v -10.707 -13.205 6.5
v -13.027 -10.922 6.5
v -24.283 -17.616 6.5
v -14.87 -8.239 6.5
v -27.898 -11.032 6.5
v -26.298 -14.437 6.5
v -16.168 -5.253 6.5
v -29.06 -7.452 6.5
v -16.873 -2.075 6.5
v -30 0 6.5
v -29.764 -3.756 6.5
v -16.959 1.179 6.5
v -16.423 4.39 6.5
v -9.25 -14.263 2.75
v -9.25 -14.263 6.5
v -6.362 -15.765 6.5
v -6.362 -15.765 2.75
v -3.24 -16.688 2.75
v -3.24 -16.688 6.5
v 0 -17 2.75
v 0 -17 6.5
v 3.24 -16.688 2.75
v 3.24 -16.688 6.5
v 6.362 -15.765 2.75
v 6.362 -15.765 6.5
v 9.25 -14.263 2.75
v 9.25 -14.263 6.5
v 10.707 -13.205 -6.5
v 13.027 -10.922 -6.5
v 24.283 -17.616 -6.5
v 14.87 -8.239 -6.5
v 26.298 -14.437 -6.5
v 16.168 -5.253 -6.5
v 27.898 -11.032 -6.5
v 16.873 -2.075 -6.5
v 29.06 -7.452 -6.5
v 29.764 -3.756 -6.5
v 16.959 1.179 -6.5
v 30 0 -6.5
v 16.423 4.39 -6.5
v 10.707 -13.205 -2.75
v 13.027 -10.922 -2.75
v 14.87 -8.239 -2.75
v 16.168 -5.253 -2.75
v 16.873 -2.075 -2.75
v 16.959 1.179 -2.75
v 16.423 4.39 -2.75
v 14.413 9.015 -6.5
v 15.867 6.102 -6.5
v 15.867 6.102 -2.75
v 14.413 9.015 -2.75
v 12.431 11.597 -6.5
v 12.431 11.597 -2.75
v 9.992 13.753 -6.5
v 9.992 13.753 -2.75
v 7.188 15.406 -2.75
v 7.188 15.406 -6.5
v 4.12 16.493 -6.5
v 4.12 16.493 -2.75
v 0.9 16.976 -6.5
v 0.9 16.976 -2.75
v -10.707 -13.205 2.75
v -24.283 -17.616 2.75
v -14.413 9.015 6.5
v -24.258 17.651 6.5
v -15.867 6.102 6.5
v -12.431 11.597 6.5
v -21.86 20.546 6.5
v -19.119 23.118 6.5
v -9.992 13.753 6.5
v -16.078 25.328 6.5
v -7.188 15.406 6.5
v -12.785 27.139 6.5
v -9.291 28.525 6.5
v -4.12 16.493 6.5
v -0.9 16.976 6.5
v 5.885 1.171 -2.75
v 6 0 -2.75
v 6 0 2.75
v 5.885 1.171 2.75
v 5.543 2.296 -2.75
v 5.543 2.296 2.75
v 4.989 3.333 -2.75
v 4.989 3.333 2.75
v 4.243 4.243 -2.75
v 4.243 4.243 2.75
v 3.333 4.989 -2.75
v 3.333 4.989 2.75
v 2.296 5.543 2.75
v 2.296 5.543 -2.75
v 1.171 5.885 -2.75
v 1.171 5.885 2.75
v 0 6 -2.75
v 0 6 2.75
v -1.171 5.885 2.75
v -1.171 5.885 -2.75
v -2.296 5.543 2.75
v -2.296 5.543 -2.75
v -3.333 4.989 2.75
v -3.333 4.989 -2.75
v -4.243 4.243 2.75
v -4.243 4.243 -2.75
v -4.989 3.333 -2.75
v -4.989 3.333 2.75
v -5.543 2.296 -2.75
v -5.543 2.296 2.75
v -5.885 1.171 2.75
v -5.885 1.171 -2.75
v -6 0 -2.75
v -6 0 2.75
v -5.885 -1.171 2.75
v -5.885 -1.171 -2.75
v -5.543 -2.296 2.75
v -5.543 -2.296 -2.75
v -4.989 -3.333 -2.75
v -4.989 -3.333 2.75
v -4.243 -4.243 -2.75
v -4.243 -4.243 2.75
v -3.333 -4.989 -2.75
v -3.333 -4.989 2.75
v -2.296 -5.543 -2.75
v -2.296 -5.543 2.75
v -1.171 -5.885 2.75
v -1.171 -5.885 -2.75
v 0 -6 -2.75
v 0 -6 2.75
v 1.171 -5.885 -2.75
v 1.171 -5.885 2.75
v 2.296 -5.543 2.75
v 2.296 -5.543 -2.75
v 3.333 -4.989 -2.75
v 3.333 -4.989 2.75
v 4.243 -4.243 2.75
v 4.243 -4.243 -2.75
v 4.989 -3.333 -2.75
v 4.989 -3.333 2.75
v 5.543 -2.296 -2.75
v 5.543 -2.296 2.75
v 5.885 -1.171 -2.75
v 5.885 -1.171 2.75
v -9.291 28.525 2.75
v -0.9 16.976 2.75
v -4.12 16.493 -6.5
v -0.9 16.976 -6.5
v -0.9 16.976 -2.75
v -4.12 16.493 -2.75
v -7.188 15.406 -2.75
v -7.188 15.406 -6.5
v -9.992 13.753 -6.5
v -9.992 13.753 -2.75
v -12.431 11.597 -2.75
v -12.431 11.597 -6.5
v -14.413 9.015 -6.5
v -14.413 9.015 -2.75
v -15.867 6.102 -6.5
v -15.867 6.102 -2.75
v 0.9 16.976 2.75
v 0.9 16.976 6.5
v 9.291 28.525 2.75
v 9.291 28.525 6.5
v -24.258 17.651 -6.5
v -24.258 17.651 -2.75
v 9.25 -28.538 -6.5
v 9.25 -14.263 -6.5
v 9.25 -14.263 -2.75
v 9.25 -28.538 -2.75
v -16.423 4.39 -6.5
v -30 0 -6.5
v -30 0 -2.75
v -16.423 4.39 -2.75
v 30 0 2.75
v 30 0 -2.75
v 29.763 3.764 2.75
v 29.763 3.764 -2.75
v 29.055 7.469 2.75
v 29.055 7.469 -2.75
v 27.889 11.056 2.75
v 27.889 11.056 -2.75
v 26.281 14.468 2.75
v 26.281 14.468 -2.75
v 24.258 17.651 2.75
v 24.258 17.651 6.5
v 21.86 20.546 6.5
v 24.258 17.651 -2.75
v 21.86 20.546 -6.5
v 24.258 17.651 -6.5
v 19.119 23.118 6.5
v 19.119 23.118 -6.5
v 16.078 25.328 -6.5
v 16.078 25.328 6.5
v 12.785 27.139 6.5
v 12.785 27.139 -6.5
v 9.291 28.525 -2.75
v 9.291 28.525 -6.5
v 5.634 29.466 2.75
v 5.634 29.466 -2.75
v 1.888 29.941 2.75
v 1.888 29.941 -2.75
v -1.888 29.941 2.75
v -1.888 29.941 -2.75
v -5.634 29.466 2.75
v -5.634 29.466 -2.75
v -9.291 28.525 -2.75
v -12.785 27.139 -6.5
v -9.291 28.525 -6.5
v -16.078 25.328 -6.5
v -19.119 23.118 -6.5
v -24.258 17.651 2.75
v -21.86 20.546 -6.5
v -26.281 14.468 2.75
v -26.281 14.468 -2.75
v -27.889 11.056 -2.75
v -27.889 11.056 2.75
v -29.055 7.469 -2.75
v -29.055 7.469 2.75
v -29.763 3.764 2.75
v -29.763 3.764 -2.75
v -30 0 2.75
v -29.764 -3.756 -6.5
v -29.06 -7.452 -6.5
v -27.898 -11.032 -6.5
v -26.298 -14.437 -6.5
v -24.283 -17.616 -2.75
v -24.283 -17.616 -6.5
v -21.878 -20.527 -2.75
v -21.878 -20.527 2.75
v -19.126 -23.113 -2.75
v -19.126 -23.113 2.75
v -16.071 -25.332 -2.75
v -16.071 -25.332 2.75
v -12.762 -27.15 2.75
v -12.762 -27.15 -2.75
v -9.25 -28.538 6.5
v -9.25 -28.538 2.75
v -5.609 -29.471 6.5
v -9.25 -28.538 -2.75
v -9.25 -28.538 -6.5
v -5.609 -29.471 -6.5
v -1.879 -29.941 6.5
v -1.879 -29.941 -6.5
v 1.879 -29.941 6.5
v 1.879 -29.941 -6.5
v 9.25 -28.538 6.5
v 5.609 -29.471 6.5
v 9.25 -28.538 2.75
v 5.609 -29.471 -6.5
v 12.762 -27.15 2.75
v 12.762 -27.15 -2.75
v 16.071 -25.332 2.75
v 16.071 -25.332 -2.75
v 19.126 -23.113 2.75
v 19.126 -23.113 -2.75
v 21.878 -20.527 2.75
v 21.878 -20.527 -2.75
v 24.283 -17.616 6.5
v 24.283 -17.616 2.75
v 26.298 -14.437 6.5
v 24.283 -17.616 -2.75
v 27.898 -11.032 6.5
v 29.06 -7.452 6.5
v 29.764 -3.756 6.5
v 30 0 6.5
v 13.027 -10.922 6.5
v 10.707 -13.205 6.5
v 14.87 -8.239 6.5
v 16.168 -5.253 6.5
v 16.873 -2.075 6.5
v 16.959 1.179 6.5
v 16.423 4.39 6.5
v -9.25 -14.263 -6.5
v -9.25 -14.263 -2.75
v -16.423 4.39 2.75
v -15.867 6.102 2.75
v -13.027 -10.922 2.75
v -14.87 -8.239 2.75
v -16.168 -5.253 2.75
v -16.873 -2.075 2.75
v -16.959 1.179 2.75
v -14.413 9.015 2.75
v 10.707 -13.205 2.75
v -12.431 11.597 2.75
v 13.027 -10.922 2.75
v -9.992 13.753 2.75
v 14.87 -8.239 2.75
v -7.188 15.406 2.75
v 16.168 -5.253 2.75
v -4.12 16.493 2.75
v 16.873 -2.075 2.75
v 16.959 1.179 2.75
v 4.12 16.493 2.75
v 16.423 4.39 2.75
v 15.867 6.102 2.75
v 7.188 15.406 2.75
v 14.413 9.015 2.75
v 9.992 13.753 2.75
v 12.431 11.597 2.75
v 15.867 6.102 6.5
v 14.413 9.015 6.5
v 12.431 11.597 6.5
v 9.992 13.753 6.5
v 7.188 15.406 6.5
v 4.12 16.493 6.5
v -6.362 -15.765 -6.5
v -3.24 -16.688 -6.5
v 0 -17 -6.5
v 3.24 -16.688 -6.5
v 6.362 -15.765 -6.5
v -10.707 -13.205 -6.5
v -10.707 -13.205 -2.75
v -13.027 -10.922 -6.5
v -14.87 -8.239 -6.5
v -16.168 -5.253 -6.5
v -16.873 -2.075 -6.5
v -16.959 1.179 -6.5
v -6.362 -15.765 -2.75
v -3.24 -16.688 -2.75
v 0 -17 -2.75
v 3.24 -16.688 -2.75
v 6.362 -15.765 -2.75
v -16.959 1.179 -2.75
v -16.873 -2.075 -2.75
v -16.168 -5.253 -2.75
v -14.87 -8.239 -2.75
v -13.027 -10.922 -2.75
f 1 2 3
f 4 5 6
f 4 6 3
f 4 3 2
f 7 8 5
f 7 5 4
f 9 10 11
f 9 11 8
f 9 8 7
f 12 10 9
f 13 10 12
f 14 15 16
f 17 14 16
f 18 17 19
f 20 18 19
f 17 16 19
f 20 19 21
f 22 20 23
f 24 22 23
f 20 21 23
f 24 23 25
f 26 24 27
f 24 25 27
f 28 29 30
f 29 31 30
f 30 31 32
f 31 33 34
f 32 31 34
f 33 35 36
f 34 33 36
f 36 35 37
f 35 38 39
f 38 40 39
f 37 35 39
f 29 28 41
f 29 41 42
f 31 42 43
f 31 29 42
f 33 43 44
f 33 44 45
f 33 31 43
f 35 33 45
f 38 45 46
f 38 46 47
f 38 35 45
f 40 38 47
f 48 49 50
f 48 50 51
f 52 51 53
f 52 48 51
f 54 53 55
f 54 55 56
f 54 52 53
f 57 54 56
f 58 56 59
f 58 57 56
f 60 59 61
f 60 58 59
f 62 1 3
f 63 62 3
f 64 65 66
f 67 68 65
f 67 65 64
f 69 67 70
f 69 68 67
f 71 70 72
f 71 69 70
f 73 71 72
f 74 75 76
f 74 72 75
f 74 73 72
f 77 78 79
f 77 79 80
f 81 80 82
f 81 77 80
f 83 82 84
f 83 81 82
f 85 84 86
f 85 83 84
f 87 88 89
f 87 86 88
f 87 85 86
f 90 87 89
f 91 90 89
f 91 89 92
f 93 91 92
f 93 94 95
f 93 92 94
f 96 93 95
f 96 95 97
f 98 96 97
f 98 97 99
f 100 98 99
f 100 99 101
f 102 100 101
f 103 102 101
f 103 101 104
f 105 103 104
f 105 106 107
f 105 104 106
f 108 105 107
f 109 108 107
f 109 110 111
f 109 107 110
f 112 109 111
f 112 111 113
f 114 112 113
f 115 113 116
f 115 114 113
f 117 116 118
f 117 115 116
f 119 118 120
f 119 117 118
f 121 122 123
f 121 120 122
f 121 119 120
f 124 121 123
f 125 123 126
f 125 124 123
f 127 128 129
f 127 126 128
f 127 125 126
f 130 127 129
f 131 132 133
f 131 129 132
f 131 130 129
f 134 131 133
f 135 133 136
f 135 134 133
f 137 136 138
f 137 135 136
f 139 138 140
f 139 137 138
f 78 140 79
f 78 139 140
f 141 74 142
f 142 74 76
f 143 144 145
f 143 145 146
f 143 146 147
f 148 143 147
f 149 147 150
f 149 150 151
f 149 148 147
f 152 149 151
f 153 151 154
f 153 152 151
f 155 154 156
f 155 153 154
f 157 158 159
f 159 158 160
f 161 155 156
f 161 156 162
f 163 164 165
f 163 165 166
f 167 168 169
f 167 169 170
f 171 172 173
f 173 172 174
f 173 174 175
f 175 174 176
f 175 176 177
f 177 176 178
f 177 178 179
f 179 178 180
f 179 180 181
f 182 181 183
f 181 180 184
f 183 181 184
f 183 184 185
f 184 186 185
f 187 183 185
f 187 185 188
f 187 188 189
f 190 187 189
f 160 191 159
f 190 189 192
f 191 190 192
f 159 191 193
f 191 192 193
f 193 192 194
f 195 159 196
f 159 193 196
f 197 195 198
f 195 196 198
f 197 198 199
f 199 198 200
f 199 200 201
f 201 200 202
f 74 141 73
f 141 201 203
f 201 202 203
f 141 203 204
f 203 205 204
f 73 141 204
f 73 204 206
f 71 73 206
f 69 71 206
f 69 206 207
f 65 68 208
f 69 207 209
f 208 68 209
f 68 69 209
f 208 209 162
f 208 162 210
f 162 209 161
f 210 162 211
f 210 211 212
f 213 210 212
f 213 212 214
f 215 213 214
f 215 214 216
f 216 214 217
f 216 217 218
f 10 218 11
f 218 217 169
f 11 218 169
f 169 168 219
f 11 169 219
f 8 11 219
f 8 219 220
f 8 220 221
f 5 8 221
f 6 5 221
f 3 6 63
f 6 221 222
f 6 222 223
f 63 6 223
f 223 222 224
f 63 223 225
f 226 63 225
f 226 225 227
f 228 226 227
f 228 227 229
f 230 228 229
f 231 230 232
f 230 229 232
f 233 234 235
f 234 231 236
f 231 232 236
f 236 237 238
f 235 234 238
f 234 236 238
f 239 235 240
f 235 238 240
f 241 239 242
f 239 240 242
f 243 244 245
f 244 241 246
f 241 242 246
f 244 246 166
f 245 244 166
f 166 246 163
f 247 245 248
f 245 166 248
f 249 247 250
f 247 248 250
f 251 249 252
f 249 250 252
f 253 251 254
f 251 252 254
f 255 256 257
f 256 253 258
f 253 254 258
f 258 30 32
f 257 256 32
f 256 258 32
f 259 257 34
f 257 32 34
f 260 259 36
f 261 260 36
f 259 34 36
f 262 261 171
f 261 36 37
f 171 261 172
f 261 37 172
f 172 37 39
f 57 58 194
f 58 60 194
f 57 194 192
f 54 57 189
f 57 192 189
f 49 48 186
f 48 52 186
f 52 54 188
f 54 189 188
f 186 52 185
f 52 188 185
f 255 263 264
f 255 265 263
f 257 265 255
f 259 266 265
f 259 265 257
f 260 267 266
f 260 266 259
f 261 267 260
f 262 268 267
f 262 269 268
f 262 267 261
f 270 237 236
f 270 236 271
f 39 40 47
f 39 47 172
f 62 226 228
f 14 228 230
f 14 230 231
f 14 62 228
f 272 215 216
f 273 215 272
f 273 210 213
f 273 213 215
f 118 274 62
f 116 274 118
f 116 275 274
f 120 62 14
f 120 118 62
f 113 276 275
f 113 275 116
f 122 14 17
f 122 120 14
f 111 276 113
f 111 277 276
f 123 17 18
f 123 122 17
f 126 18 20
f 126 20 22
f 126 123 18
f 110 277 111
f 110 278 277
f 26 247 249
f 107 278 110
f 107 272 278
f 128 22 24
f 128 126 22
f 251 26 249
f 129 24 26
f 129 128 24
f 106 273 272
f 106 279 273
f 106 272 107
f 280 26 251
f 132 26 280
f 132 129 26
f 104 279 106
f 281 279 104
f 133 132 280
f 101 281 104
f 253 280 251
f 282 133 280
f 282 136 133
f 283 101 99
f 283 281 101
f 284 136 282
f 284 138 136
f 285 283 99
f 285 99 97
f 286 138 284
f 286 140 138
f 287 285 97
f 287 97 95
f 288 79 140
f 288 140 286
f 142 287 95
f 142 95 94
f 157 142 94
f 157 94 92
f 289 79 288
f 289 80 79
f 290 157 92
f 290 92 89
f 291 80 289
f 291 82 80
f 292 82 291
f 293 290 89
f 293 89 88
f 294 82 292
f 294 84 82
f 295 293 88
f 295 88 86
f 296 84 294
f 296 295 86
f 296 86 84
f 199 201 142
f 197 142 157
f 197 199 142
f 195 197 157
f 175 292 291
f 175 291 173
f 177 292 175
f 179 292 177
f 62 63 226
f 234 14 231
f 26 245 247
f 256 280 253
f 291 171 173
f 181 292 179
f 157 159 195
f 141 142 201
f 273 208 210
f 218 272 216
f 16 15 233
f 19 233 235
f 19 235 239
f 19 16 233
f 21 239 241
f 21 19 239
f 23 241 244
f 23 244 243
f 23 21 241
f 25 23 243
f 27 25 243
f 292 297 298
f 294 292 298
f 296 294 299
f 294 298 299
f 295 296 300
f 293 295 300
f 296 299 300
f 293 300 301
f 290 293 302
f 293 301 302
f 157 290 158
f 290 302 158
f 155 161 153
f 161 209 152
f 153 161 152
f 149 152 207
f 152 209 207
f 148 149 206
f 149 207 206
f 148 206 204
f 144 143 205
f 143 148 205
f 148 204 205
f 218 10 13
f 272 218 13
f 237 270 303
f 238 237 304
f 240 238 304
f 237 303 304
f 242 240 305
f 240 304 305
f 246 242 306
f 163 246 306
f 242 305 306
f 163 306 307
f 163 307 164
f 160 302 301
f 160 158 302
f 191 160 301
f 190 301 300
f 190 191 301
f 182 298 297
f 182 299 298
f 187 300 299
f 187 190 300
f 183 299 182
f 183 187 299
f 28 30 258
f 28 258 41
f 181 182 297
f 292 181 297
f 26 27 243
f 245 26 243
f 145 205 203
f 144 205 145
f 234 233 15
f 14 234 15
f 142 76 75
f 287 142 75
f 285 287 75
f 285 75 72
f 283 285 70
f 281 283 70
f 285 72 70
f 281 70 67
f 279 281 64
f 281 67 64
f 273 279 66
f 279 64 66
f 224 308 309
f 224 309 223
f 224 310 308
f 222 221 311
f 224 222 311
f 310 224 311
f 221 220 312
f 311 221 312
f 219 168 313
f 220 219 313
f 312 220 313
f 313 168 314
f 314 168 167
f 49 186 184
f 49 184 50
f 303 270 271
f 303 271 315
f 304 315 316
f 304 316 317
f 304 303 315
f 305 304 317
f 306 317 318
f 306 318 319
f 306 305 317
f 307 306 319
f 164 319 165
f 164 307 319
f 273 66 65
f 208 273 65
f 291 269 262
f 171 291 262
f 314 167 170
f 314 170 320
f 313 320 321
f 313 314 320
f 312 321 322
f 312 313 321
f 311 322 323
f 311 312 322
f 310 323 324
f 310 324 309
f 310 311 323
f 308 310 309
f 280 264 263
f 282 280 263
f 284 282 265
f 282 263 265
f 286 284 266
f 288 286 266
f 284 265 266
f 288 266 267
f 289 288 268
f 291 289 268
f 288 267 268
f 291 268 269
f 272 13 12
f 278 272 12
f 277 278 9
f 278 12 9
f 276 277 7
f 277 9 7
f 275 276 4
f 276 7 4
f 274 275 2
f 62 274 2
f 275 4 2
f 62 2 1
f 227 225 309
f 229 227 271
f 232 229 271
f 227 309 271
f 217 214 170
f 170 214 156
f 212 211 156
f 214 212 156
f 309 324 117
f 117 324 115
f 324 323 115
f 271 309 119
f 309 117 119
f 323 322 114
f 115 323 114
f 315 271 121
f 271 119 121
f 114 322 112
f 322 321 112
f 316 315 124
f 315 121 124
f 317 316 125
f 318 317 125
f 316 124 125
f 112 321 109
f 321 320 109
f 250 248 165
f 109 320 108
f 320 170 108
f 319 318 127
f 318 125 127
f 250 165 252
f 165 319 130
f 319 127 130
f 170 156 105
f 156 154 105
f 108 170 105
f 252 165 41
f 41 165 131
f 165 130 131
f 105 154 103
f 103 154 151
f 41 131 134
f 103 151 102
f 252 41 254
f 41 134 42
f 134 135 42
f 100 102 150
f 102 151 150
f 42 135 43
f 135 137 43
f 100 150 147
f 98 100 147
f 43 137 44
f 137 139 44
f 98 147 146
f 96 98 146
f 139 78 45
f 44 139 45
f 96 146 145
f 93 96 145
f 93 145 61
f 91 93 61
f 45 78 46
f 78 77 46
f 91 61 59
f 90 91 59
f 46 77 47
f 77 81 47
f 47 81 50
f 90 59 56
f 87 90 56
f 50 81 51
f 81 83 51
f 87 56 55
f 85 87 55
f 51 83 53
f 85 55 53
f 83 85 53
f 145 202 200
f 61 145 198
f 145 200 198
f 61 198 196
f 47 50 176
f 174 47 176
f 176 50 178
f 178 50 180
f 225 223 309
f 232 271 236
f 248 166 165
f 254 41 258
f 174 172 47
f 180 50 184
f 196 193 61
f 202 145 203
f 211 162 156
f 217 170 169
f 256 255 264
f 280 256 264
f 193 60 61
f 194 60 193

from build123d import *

# Parameters (mm, degrees)
BOSS_EXTRU_1_DEPTH      = 6.5
BOSS_EXTRU_1_DEPTH_BACK = 6.5
ESQUISSE1_R             = 30
ESQUISSE1_R_2           = 6
ESQUISSE3_R             = 6
ENL_V_MAT_EXTRU_1_DEPTH = 3.75


with BuildPart() as part:
    # Esquisse1 → Boss.-Extru.1 (new, two sides: drawn at the far end of the back side and taken through both)
    with BuildSketch(Plane.XY.offset(-BOSS_EXTRU_1_DEPTH_BACK)):
        Circle(ESQUISSE1_R)
        Circle(ESQUISSE1_R_2, mode=Mode.SUBTRACT)
    extrude(amount=BOSS_EXTRU_1_DEPTH + BOSS_EXTRU_1_DEPTH_BACK)

    # Esquisse3 → Enlèv. mat.-Extru.1 (cut)
    with BuildSketch(Plane.XY.offset(6.5)):
        with BuildLine():
            ThreePointArc((-9.25, -14.263151826), (0, -17), (9.25, -14.263151826))
            Line((9.25, -14.263151826), (9.25, -28.538351389))
            ThreePointArc((9.25, -28.538351389), (17.633557569, -24.270509831), (24.283177855, -17.616108346))
            Line((24.283177855, -17.616108346), (10.706656289, -13.204829083))
            ThreePointArc((10.706656289, -13.204829083), (16.167960777, -5.253288904), (16.423470685, 4.389716468))
            Line((16.423470685, 4.389716468), (30, 0))
            ThreePointArc((30, 0), (28.528362011, 9.280762952), (24.257829269, 17.650997681))
            Line((24.257829269, 17.650997681), (15.867077492, 6.102118637))
            ThreePointArc((15.867077492, 6.102118637), (9.992349289, 13.753288904), (0.900263096, 16.976145804))
            Line((0.900263096, 16.976145804), (9.291014873, 28.525024849))
            ThreePointArc((9.291014873, 28.525024849), (0, 30), (-9.291014873, 28.525024849))
            Line((-9.291014873, 28.525024849), (-0.900263096, 16.976145804))
            ThreePointArc((-0.900263096, 16.976145804), (-9.992349289, 13.753288904), (-15.867077492, 6.102118637))
            Line((-15.867077492, 6.102118637), (-24.257829269, 17.650997681))
            ThreePointArc((-24.257829269, 17.650997681), (-28.528362011, 9.280762952), (-30, 0))
            Line((-30, 0), (-16.423470685, 4.389716468))
            ThreePointArc((-16.423470685, 4.389716468), (-16.167960777, -5.253288904), (-10.706656289, -13.204829083))
            Line((-10.706656289, -13.204829083), (-24.283177855, -17.616108346))
            ThreePointArc((-24.283177855, -17.616108346), (-17.633557569, -24.270509831), (-9.25, -28.538351389))
            Line((-9.25, -28.538351389), (-9.25, -14.263151826))
        make_face()
        Circle(ESQUISSE3_R, mode=Mode.SUBTRACT)
    enl_v_mat_extru_1 = extrude(amount=-ENL_V_MAT_EXTRU_1_DEPTH, mode=Mode.SUBTRACT)

    # Symétrie1: Enlèv. mat.-Extru.1 across plane
    add(enl_v_mat_extru_1.mirror(Plane.XY), mode=Mode.SUBTRACT)


solid = part.part
